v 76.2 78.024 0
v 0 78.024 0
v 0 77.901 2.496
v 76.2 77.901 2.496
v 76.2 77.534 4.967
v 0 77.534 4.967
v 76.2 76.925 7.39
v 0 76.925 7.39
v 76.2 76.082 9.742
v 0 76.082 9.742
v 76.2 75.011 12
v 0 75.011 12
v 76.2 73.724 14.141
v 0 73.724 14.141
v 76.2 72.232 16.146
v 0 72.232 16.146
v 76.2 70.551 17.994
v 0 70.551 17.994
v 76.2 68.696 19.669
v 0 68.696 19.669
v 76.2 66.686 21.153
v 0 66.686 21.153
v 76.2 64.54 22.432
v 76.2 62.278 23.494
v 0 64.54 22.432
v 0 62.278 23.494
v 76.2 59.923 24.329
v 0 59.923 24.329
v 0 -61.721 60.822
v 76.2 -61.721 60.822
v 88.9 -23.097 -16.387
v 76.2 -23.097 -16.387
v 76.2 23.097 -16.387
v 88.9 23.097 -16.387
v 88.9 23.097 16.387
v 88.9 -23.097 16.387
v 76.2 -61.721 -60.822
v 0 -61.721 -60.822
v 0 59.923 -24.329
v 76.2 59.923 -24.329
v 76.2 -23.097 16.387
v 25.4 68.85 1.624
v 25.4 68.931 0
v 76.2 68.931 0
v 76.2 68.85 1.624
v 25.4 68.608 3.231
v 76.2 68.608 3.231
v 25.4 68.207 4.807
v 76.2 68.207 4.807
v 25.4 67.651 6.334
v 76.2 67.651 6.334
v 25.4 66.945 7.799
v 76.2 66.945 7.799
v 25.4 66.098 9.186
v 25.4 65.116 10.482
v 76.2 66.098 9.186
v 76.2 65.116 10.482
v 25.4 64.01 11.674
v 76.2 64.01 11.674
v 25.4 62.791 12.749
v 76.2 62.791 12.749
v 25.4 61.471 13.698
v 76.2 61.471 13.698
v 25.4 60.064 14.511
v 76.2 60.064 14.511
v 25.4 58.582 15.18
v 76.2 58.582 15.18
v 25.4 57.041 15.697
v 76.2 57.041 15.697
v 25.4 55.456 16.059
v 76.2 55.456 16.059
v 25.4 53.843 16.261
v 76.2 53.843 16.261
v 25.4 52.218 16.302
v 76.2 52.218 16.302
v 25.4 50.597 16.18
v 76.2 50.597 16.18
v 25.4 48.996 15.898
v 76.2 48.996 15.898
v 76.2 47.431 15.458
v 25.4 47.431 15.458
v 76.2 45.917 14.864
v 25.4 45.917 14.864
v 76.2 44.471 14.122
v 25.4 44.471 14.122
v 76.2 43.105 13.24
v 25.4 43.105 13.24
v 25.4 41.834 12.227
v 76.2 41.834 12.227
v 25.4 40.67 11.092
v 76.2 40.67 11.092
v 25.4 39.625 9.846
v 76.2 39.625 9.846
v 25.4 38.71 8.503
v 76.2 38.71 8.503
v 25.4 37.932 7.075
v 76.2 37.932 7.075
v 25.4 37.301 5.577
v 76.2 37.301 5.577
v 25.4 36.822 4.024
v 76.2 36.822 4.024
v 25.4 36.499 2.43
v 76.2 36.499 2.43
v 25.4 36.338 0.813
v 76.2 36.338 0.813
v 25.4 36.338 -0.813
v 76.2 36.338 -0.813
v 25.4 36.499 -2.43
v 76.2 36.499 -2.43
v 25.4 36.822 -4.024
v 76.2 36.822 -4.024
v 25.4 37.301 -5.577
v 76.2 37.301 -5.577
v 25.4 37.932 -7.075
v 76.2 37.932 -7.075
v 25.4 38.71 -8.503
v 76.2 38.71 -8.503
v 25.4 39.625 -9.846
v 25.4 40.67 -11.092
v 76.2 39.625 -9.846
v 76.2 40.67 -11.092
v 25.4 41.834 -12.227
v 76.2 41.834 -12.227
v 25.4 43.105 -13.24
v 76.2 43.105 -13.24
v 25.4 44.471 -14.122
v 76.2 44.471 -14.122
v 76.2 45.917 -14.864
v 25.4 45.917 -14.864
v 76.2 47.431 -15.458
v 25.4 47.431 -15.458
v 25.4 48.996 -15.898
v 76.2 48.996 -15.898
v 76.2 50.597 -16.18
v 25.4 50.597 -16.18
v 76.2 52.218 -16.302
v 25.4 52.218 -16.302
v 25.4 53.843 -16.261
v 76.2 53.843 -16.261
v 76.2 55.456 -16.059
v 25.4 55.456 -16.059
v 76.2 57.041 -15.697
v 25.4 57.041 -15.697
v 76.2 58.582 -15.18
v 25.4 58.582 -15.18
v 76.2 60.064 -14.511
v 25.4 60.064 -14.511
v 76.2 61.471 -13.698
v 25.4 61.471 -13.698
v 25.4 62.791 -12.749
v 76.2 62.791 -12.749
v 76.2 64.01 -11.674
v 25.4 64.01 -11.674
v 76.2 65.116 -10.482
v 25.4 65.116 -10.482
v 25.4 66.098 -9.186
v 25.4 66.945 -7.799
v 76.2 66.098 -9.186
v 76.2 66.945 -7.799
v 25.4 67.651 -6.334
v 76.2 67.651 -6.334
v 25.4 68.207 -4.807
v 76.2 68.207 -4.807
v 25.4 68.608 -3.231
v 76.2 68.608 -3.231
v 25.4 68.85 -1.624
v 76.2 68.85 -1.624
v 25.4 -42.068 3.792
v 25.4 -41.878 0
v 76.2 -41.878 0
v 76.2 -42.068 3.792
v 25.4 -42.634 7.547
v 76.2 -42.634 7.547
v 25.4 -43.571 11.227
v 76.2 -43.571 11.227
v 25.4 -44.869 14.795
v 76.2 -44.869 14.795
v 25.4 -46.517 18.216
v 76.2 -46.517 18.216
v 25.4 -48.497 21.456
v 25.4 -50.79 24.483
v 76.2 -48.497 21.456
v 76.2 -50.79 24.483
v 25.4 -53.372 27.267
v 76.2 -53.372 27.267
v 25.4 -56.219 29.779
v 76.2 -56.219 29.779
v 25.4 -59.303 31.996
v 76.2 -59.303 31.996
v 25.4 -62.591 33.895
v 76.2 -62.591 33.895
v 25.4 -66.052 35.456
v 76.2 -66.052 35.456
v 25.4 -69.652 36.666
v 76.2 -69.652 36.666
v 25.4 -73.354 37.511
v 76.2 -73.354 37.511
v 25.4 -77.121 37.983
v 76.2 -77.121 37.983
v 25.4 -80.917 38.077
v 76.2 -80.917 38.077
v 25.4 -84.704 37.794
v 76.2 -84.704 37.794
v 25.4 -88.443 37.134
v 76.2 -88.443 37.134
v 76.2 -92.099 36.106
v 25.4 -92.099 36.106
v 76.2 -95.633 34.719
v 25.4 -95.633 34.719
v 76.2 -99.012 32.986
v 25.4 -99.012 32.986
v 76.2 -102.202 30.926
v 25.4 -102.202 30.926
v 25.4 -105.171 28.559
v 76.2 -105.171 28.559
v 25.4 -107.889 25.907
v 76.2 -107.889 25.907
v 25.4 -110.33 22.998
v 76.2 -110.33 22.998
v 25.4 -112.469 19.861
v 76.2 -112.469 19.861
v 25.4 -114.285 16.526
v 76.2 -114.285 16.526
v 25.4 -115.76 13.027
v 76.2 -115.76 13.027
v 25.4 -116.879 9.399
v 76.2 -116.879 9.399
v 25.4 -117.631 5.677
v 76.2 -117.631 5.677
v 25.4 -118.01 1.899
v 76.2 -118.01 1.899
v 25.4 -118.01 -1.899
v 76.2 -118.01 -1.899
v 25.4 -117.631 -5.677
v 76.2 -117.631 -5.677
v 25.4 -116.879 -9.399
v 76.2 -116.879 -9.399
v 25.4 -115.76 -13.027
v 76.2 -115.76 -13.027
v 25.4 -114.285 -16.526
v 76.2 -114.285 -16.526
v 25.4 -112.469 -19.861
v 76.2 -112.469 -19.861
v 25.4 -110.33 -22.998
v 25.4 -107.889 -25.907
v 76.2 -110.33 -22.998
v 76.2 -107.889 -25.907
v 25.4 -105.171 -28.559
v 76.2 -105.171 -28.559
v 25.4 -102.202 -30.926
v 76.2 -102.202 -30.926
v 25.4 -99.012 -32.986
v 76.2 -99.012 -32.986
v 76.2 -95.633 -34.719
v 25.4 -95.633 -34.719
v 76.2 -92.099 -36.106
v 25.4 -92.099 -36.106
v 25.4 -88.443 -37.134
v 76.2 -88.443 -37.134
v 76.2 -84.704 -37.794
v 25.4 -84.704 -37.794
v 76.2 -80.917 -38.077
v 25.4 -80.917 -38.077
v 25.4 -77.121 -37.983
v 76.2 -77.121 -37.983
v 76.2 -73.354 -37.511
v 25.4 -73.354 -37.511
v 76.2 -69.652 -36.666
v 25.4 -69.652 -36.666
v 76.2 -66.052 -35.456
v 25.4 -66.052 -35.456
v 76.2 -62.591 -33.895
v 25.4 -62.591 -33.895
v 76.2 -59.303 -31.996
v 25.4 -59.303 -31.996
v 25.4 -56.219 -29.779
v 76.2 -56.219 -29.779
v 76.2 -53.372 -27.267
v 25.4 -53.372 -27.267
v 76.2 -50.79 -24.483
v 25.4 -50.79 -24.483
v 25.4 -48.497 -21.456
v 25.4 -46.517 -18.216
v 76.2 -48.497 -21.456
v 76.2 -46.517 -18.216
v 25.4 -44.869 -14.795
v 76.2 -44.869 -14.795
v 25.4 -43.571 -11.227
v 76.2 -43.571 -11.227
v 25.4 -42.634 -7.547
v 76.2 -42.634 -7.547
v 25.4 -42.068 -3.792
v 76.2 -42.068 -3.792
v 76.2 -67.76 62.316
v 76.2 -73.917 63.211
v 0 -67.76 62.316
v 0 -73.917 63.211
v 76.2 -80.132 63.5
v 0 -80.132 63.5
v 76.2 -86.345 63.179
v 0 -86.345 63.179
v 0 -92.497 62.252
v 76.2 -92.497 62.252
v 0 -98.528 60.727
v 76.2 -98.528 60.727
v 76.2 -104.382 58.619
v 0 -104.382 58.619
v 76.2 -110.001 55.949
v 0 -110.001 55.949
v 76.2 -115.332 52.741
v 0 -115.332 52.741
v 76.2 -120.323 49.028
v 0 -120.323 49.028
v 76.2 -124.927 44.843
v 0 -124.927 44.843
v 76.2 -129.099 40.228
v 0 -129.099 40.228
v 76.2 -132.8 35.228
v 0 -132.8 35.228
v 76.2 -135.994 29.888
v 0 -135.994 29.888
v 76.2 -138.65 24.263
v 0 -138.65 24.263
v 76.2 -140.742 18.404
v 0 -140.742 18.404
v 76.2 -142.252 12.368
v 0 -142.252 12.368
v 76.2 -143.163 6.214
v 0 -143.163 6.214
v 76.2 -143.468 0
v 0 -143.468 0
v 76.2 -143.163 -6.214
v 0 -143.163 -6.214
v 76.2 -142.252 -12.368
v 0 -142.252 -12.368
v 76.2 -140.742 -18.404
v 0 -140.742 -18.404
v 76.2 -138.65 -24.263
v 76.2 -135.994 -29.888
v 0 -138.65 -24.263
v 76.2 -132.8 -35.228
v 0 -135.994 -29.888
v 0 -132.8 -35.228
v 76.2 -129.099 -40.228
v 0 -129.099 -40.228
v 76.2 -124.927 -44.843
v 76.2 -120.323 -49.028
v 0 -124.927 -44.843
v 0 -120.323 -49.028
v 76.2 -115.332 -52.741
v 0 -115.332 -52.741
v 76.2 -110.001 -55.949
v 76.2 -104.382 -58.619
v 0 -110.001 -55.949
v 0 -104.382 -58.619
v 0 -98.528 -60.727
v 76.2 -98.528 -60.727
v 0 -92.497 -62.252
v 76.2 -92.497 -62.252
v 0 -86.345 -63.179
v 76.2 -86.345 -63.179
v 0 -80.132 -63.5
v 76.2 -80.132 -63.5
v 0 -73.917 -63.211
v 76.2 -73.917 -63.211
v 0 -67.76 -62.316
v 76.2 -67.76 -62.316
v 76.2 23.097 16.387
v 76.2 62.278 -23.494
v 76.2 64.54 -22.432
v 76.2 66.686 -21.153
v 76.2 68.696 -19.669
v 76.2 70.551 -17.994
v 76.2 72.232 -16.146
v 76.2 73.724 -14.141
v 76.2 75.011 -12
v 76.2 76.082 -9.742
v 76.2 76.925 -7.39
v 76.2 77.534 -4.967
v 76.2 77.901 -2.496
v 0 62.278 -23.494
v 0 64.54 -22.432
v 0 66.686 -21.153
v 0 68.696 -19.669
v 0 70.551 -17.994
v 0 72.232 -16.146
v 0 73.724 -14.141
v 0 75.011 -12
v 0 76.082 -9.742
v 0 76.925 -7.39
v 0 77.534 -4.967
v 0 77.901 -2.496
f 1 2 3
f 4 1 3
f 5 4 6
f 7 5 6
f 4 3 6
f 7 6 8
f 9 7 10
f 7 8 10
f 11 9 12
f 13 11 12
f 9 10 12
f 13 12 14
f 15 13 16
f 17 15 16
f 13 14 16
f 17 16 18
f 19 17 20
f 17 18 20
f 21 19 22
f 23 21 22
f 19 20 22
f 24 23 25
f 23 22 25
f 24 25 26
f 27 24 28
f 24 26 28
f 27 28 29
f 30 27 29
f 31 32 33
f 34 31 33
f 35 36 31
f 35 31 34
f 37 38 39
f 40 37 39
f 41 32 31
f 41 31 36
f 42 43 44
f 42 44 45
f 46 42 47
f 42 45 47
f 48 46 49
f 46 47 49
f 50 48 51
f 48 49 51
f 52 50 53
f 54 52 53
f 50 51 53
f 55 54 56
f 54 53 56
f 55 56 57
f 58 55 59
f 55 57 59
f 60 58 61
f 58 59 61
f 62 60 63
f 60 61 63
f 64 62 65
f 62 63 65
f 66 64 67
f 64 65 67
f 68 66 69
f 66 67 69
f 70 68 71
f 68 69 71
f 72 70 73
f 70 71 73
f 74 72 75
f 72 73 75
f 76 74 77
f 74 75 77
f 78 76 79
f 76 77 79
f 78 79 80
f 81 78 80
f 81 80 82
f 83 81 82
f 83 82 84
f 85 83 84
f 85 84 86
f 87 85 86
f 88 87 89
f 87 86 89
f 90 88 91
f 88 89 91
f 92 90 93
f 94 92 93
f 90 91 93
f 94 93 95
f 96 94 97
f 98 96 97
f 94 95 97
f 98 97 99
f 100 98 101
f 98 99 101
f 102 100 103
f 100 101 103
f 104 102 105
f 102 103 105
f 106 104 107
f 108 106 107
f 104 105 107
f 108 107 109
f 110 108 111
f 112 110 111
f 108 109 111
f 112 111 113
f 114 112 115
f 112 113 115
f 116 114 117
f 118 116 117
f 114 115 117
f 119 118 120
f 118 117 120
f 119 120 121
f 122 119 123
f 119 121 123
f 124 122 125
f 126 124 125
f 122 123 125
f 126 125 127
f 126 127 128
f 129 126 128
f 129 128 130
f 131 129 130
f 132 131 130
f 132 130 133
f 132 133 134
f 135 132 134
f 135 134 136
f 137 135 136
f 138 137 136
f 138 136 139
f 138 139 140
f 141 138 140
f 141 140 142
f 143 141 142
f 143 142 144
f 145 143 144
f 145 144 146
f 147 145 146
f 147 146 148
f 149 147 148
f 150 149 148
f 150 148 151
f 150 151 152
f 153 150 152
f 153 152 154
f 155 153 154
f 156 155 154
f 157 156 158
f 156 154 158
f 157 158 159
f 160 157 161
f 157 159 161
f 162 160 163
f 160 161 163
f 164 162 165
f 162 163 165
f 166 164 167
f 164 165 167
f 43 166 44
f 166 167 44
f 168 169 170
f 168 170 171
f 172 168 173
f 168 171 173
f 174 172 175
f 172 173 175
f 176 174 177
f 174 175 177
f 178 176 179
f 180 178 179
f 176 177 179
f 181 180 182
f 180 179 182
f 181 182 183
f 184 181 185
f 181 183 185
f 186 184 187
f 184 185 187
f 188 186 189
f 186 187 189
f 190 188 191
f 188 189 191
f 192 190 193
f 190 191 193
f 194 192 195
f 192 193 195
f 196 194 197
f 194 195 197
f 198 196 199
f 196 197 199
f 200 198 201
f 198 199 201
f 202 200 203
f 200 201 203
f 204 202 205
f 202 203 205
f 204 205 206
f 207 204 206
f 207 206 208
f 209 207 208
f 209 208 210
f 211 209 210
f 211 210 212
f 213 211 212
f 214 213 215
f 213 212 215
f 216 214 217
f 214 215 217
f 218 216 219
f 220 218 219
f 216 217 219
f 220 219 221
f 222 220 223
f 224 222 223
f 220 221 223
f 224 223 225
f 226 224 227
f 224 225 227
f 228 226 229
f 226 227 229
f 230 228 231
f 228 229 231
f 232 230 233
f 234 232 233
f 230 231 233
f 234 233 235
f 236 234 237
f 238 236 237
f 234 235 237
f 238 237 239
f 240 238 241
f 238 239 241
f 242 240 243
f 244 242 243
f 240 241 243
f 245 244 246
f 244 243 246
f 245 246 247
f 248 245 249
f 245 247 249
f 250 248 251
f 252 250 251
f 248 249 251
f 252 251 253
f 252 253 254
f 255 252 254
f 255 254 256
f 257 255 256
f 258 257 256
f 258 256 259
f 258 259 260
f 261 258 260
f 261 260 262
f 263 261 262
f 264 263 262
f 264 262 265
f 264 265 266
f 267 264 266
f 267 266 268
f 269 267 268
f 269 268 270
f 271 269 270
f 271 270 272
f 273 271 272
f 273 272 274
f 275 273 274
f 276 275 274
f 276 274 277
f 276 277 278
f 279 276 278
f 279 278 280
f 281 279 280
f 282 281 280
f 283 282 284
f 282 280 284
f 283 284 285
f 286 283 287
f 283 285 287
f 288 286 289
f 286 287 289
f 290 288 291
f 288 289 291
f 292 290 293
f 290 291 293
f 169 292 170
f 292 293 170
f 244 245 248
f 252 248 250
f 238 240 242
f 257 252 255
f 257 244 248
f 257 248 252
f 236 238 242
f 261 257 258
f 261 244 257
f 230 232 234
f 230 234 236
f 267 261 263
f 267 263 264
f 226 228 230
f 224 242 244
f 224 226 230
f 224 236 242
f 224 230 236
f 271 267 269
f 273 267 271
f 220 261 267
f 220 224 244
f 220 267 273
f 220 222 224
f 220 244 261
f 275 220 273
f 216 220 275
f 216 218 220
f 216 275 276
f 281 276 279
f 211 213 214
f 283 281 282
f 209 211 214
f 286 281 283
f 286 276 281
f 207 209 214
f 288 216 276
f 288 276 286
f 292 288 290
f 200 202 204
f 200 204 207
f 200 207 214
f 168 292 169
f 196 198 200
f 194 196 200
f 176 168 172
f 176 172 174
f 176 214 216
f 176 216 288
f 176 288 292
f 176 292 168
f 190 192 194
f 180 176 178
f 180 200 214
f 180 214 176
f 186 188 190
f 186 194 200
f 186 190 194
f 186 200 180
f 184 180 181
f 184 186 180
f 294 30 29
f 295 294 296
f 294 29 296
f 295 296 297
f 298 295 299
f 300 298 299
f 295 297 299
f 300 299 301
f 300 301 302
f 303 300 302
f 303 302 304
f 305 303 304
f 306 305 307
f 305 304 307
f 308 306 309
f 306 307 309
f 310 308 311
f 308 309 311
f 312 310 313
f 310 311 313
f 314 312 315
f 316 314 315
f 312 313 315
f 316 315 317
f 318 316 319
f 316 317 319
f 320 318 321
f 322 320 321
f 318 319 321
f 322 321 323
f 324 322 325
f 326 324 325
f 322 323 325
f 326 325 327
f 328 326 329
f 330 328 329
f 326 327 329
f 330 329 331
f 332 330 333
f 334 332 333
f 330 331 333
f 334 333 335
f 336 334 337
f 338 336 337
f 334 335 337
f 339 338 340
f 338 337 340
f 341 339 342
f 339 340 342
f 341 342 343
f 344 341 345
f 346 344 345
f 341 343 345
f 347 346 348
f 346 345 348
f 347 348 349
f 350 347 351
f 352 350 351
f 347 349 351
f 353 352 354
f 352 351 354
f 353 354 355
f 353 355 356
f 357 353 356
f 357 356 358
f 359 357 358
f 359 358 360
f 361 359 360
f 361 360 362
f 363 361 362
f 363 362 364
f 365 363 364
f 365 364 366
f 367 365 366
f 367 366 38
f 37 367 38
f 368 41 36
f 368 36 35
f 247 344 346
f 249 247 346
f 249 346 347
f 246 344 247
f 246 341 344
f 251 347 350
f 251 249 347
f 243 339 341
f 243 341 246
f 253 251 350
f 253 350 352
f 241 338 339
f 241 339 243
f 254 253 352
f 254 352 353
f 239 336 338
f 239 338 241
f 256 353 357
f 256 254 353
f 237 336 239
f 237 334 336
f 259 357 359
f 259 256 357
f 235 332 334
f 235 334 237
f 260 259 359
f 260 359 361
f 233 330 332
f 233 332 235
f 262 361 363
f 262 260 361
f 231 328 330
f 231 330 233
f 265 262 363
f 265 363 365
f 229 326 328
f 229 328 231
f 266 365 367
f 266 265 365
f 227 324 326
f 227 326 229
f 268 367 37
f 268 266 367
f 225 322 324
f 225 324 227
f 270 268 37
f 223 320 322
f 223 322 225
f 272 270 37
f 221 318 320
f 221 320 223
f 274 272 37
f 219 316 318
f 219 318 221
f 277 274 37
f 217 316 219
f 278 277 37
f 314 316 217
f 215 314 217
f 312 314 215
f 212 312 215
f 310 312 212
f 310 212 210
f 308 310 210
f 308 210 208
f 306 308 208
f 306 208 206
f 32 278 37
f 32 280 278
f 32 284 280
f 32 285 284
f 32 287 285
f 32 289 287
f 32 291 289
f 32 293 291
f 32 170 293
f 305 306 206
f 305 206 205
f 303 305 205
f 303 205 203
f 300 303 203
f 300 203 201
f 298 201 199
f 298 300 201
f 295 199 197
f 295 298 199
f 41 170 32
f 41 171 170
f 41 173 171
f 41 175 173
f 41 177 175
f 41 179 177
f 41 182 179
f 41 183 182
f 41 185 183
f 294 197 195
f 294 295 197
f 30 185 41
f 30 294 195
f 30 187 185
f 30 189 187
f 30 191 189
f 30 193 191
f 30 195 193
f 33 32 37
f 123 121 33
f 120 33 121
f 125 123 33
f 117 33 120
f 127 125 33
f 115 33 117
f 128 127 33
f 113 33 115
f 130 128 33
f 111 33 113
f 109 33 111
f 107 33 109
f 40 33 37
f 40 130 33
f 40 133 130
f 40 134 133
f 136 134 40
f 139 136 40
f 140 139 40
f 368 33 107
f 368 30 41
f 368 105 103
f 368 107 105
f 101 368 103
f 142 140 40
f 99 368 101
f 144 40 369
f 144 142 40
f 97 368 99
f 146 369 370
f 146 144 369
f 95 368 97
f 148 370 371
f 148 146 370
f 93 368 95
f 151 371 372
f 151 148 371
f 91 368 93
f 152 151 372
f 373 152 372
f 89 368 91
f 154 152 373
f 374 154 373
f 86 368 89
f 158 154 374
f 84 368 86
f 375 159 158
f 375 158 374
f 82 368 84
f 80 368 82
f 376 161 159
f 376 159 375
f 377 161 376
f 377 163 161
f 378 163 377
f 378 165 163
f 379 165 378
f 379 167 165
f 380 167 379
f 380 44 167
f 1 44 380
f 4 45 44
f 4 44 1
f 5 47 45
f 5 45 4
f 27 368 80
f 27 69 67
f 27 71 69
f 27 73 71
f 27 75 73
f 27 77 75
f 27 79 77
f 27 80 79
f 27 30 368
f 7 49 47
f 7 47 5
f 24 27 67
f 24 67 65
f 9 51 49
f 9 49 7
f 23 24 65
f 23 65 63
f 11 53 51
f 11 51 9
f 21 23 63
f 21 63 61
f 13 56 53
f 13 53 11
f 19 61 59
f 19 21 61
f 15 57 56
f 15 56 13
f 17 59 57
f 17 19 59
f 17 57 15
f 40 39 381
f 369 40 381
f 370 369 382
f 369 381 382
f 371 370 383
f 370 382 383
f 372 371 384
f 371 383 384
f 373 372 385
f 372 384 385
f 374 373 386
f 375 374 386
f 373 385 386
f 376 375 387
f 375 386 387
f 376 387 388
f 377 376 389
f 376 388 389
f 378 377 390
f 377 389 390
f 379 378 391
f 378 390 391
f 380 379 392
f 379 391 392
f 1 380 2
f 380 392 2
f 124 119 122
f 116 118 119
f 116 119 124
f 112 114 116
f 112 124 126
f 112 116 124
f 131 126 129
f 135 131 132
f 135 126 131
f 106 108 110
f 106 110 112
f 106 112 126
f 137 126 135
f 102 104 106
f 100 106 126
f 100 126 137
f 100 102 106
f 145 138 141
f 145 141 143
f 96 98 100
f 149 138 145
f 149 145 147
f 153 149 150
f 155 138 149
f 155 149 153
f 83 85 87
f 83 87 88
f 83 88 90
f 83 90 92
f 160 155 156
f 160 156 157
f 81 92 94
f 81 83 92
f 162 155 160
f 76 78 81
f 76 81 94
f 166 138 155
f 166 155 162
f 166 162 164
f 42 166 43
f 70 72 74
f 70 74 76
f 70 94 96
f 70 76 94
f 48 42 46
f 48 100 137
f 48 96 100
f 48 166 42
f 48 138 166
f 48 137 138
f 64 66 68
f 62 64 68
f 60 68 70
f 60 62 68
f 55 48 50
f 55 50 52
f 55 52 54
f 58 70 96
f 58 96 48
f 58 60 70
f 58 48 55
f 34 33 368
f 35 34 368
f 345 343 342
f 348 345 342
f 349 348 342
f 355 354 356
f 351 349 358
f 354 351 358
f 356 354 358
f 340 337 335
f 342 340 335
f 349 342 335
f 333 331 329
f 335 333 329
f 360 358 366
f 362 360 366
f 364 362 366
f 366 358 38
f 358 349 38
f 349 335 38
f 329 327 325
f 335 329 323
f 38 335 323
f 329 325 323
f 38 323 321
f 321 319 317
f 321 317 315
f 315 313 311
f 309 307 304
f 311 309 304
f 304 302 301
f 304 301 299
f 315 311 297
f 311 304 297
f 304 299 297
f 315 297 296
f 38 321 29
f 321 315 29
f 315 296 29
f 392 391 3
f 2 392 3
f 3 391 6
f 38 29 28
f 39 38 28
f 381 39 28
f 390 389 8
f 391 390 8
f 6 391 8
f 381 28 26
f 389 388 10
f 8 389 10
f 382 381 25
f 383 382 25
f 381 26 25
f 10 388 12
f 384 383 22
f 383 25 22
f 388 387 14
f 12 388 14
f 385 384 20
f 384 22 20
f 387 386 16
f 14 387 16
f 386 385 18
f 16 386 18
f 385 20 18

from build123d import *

# Parameters (mm, degrees)
F1_DEPTH = 76.2
F2_R     = 38.089207
F2_R_2   = 16.306918
F3_DEPTH = 50.8
F4_W     = 46.19369
F4_H     = 32.77332
F5_DEPTH = 12.7


with BuildPart() as f1:
    # F0 (on Right) → F1 (new body)
    with BuildSketch(Plane.YZ):
        with BuildLine():
            ThreePointArc((-61.721072, -60.821969), (-29.022062, -37.905089), (-16.467663, 0))
            ThreePointArc((-16.467663, 0), (-29.022062, 37.905089), (-61.721072, 60.821969))
            ThreePointArc((-61.721072, 60.821969), (-143.467663, 0), (-61.721072, -60.821969))
        make_face()
        with BuildLine():
            ThreePointArc((-61.721072, 60.821969), (-29.022062, 37.905089), (-16.467663, 0))
            ThreePointArc((-16.467663, 0), (-29.022062, -37.905089), (-61.721072, -60.821969))
            Line((-61.721072, -60.821969), (59.922866, -24.328788))
            ThreePointArc((59.922866, -24.328788), (27.22423, 0), (59.922866, 24.328788))
            Line((59.922866, 24.328788), (-61.721072, 60.821969))
        make_face()
        with BuildLine():
            ThreePointArc((78.02423, 0), (73.00247, 15.162035), (59.922866, 24.328788))
            ThreePointArc((59.922866, 24.328788), (27.22423, 0), (59.922866, -24.328788))
            ThreePointArc((59.922866, -24.328788), (73.00247, -15.162035), (78.02423, 0))
        make_face()
    extrude(amount=F1_DEPTH)

    # F2 (on face) → F3 (cut)
    with BuildSketch(Plane.YZ.offset(76.2)):
        with Locations((-79.967663, 0)):
            Circle(F2_R)
        with Locations((52.62423, 0)):
            Circle(F2_R_2)
    extrude(amount=-F3_DEPTH, mode=Mode.SUBTRACT)

    # F4 (on face) → F5 (join)
    with BuildSketch(Plane.YZ.offset(76.2)):
        Rectangle(F4_W, F4_H)
    extrude(amount=F5_DEPTH)


solid = f1.part
